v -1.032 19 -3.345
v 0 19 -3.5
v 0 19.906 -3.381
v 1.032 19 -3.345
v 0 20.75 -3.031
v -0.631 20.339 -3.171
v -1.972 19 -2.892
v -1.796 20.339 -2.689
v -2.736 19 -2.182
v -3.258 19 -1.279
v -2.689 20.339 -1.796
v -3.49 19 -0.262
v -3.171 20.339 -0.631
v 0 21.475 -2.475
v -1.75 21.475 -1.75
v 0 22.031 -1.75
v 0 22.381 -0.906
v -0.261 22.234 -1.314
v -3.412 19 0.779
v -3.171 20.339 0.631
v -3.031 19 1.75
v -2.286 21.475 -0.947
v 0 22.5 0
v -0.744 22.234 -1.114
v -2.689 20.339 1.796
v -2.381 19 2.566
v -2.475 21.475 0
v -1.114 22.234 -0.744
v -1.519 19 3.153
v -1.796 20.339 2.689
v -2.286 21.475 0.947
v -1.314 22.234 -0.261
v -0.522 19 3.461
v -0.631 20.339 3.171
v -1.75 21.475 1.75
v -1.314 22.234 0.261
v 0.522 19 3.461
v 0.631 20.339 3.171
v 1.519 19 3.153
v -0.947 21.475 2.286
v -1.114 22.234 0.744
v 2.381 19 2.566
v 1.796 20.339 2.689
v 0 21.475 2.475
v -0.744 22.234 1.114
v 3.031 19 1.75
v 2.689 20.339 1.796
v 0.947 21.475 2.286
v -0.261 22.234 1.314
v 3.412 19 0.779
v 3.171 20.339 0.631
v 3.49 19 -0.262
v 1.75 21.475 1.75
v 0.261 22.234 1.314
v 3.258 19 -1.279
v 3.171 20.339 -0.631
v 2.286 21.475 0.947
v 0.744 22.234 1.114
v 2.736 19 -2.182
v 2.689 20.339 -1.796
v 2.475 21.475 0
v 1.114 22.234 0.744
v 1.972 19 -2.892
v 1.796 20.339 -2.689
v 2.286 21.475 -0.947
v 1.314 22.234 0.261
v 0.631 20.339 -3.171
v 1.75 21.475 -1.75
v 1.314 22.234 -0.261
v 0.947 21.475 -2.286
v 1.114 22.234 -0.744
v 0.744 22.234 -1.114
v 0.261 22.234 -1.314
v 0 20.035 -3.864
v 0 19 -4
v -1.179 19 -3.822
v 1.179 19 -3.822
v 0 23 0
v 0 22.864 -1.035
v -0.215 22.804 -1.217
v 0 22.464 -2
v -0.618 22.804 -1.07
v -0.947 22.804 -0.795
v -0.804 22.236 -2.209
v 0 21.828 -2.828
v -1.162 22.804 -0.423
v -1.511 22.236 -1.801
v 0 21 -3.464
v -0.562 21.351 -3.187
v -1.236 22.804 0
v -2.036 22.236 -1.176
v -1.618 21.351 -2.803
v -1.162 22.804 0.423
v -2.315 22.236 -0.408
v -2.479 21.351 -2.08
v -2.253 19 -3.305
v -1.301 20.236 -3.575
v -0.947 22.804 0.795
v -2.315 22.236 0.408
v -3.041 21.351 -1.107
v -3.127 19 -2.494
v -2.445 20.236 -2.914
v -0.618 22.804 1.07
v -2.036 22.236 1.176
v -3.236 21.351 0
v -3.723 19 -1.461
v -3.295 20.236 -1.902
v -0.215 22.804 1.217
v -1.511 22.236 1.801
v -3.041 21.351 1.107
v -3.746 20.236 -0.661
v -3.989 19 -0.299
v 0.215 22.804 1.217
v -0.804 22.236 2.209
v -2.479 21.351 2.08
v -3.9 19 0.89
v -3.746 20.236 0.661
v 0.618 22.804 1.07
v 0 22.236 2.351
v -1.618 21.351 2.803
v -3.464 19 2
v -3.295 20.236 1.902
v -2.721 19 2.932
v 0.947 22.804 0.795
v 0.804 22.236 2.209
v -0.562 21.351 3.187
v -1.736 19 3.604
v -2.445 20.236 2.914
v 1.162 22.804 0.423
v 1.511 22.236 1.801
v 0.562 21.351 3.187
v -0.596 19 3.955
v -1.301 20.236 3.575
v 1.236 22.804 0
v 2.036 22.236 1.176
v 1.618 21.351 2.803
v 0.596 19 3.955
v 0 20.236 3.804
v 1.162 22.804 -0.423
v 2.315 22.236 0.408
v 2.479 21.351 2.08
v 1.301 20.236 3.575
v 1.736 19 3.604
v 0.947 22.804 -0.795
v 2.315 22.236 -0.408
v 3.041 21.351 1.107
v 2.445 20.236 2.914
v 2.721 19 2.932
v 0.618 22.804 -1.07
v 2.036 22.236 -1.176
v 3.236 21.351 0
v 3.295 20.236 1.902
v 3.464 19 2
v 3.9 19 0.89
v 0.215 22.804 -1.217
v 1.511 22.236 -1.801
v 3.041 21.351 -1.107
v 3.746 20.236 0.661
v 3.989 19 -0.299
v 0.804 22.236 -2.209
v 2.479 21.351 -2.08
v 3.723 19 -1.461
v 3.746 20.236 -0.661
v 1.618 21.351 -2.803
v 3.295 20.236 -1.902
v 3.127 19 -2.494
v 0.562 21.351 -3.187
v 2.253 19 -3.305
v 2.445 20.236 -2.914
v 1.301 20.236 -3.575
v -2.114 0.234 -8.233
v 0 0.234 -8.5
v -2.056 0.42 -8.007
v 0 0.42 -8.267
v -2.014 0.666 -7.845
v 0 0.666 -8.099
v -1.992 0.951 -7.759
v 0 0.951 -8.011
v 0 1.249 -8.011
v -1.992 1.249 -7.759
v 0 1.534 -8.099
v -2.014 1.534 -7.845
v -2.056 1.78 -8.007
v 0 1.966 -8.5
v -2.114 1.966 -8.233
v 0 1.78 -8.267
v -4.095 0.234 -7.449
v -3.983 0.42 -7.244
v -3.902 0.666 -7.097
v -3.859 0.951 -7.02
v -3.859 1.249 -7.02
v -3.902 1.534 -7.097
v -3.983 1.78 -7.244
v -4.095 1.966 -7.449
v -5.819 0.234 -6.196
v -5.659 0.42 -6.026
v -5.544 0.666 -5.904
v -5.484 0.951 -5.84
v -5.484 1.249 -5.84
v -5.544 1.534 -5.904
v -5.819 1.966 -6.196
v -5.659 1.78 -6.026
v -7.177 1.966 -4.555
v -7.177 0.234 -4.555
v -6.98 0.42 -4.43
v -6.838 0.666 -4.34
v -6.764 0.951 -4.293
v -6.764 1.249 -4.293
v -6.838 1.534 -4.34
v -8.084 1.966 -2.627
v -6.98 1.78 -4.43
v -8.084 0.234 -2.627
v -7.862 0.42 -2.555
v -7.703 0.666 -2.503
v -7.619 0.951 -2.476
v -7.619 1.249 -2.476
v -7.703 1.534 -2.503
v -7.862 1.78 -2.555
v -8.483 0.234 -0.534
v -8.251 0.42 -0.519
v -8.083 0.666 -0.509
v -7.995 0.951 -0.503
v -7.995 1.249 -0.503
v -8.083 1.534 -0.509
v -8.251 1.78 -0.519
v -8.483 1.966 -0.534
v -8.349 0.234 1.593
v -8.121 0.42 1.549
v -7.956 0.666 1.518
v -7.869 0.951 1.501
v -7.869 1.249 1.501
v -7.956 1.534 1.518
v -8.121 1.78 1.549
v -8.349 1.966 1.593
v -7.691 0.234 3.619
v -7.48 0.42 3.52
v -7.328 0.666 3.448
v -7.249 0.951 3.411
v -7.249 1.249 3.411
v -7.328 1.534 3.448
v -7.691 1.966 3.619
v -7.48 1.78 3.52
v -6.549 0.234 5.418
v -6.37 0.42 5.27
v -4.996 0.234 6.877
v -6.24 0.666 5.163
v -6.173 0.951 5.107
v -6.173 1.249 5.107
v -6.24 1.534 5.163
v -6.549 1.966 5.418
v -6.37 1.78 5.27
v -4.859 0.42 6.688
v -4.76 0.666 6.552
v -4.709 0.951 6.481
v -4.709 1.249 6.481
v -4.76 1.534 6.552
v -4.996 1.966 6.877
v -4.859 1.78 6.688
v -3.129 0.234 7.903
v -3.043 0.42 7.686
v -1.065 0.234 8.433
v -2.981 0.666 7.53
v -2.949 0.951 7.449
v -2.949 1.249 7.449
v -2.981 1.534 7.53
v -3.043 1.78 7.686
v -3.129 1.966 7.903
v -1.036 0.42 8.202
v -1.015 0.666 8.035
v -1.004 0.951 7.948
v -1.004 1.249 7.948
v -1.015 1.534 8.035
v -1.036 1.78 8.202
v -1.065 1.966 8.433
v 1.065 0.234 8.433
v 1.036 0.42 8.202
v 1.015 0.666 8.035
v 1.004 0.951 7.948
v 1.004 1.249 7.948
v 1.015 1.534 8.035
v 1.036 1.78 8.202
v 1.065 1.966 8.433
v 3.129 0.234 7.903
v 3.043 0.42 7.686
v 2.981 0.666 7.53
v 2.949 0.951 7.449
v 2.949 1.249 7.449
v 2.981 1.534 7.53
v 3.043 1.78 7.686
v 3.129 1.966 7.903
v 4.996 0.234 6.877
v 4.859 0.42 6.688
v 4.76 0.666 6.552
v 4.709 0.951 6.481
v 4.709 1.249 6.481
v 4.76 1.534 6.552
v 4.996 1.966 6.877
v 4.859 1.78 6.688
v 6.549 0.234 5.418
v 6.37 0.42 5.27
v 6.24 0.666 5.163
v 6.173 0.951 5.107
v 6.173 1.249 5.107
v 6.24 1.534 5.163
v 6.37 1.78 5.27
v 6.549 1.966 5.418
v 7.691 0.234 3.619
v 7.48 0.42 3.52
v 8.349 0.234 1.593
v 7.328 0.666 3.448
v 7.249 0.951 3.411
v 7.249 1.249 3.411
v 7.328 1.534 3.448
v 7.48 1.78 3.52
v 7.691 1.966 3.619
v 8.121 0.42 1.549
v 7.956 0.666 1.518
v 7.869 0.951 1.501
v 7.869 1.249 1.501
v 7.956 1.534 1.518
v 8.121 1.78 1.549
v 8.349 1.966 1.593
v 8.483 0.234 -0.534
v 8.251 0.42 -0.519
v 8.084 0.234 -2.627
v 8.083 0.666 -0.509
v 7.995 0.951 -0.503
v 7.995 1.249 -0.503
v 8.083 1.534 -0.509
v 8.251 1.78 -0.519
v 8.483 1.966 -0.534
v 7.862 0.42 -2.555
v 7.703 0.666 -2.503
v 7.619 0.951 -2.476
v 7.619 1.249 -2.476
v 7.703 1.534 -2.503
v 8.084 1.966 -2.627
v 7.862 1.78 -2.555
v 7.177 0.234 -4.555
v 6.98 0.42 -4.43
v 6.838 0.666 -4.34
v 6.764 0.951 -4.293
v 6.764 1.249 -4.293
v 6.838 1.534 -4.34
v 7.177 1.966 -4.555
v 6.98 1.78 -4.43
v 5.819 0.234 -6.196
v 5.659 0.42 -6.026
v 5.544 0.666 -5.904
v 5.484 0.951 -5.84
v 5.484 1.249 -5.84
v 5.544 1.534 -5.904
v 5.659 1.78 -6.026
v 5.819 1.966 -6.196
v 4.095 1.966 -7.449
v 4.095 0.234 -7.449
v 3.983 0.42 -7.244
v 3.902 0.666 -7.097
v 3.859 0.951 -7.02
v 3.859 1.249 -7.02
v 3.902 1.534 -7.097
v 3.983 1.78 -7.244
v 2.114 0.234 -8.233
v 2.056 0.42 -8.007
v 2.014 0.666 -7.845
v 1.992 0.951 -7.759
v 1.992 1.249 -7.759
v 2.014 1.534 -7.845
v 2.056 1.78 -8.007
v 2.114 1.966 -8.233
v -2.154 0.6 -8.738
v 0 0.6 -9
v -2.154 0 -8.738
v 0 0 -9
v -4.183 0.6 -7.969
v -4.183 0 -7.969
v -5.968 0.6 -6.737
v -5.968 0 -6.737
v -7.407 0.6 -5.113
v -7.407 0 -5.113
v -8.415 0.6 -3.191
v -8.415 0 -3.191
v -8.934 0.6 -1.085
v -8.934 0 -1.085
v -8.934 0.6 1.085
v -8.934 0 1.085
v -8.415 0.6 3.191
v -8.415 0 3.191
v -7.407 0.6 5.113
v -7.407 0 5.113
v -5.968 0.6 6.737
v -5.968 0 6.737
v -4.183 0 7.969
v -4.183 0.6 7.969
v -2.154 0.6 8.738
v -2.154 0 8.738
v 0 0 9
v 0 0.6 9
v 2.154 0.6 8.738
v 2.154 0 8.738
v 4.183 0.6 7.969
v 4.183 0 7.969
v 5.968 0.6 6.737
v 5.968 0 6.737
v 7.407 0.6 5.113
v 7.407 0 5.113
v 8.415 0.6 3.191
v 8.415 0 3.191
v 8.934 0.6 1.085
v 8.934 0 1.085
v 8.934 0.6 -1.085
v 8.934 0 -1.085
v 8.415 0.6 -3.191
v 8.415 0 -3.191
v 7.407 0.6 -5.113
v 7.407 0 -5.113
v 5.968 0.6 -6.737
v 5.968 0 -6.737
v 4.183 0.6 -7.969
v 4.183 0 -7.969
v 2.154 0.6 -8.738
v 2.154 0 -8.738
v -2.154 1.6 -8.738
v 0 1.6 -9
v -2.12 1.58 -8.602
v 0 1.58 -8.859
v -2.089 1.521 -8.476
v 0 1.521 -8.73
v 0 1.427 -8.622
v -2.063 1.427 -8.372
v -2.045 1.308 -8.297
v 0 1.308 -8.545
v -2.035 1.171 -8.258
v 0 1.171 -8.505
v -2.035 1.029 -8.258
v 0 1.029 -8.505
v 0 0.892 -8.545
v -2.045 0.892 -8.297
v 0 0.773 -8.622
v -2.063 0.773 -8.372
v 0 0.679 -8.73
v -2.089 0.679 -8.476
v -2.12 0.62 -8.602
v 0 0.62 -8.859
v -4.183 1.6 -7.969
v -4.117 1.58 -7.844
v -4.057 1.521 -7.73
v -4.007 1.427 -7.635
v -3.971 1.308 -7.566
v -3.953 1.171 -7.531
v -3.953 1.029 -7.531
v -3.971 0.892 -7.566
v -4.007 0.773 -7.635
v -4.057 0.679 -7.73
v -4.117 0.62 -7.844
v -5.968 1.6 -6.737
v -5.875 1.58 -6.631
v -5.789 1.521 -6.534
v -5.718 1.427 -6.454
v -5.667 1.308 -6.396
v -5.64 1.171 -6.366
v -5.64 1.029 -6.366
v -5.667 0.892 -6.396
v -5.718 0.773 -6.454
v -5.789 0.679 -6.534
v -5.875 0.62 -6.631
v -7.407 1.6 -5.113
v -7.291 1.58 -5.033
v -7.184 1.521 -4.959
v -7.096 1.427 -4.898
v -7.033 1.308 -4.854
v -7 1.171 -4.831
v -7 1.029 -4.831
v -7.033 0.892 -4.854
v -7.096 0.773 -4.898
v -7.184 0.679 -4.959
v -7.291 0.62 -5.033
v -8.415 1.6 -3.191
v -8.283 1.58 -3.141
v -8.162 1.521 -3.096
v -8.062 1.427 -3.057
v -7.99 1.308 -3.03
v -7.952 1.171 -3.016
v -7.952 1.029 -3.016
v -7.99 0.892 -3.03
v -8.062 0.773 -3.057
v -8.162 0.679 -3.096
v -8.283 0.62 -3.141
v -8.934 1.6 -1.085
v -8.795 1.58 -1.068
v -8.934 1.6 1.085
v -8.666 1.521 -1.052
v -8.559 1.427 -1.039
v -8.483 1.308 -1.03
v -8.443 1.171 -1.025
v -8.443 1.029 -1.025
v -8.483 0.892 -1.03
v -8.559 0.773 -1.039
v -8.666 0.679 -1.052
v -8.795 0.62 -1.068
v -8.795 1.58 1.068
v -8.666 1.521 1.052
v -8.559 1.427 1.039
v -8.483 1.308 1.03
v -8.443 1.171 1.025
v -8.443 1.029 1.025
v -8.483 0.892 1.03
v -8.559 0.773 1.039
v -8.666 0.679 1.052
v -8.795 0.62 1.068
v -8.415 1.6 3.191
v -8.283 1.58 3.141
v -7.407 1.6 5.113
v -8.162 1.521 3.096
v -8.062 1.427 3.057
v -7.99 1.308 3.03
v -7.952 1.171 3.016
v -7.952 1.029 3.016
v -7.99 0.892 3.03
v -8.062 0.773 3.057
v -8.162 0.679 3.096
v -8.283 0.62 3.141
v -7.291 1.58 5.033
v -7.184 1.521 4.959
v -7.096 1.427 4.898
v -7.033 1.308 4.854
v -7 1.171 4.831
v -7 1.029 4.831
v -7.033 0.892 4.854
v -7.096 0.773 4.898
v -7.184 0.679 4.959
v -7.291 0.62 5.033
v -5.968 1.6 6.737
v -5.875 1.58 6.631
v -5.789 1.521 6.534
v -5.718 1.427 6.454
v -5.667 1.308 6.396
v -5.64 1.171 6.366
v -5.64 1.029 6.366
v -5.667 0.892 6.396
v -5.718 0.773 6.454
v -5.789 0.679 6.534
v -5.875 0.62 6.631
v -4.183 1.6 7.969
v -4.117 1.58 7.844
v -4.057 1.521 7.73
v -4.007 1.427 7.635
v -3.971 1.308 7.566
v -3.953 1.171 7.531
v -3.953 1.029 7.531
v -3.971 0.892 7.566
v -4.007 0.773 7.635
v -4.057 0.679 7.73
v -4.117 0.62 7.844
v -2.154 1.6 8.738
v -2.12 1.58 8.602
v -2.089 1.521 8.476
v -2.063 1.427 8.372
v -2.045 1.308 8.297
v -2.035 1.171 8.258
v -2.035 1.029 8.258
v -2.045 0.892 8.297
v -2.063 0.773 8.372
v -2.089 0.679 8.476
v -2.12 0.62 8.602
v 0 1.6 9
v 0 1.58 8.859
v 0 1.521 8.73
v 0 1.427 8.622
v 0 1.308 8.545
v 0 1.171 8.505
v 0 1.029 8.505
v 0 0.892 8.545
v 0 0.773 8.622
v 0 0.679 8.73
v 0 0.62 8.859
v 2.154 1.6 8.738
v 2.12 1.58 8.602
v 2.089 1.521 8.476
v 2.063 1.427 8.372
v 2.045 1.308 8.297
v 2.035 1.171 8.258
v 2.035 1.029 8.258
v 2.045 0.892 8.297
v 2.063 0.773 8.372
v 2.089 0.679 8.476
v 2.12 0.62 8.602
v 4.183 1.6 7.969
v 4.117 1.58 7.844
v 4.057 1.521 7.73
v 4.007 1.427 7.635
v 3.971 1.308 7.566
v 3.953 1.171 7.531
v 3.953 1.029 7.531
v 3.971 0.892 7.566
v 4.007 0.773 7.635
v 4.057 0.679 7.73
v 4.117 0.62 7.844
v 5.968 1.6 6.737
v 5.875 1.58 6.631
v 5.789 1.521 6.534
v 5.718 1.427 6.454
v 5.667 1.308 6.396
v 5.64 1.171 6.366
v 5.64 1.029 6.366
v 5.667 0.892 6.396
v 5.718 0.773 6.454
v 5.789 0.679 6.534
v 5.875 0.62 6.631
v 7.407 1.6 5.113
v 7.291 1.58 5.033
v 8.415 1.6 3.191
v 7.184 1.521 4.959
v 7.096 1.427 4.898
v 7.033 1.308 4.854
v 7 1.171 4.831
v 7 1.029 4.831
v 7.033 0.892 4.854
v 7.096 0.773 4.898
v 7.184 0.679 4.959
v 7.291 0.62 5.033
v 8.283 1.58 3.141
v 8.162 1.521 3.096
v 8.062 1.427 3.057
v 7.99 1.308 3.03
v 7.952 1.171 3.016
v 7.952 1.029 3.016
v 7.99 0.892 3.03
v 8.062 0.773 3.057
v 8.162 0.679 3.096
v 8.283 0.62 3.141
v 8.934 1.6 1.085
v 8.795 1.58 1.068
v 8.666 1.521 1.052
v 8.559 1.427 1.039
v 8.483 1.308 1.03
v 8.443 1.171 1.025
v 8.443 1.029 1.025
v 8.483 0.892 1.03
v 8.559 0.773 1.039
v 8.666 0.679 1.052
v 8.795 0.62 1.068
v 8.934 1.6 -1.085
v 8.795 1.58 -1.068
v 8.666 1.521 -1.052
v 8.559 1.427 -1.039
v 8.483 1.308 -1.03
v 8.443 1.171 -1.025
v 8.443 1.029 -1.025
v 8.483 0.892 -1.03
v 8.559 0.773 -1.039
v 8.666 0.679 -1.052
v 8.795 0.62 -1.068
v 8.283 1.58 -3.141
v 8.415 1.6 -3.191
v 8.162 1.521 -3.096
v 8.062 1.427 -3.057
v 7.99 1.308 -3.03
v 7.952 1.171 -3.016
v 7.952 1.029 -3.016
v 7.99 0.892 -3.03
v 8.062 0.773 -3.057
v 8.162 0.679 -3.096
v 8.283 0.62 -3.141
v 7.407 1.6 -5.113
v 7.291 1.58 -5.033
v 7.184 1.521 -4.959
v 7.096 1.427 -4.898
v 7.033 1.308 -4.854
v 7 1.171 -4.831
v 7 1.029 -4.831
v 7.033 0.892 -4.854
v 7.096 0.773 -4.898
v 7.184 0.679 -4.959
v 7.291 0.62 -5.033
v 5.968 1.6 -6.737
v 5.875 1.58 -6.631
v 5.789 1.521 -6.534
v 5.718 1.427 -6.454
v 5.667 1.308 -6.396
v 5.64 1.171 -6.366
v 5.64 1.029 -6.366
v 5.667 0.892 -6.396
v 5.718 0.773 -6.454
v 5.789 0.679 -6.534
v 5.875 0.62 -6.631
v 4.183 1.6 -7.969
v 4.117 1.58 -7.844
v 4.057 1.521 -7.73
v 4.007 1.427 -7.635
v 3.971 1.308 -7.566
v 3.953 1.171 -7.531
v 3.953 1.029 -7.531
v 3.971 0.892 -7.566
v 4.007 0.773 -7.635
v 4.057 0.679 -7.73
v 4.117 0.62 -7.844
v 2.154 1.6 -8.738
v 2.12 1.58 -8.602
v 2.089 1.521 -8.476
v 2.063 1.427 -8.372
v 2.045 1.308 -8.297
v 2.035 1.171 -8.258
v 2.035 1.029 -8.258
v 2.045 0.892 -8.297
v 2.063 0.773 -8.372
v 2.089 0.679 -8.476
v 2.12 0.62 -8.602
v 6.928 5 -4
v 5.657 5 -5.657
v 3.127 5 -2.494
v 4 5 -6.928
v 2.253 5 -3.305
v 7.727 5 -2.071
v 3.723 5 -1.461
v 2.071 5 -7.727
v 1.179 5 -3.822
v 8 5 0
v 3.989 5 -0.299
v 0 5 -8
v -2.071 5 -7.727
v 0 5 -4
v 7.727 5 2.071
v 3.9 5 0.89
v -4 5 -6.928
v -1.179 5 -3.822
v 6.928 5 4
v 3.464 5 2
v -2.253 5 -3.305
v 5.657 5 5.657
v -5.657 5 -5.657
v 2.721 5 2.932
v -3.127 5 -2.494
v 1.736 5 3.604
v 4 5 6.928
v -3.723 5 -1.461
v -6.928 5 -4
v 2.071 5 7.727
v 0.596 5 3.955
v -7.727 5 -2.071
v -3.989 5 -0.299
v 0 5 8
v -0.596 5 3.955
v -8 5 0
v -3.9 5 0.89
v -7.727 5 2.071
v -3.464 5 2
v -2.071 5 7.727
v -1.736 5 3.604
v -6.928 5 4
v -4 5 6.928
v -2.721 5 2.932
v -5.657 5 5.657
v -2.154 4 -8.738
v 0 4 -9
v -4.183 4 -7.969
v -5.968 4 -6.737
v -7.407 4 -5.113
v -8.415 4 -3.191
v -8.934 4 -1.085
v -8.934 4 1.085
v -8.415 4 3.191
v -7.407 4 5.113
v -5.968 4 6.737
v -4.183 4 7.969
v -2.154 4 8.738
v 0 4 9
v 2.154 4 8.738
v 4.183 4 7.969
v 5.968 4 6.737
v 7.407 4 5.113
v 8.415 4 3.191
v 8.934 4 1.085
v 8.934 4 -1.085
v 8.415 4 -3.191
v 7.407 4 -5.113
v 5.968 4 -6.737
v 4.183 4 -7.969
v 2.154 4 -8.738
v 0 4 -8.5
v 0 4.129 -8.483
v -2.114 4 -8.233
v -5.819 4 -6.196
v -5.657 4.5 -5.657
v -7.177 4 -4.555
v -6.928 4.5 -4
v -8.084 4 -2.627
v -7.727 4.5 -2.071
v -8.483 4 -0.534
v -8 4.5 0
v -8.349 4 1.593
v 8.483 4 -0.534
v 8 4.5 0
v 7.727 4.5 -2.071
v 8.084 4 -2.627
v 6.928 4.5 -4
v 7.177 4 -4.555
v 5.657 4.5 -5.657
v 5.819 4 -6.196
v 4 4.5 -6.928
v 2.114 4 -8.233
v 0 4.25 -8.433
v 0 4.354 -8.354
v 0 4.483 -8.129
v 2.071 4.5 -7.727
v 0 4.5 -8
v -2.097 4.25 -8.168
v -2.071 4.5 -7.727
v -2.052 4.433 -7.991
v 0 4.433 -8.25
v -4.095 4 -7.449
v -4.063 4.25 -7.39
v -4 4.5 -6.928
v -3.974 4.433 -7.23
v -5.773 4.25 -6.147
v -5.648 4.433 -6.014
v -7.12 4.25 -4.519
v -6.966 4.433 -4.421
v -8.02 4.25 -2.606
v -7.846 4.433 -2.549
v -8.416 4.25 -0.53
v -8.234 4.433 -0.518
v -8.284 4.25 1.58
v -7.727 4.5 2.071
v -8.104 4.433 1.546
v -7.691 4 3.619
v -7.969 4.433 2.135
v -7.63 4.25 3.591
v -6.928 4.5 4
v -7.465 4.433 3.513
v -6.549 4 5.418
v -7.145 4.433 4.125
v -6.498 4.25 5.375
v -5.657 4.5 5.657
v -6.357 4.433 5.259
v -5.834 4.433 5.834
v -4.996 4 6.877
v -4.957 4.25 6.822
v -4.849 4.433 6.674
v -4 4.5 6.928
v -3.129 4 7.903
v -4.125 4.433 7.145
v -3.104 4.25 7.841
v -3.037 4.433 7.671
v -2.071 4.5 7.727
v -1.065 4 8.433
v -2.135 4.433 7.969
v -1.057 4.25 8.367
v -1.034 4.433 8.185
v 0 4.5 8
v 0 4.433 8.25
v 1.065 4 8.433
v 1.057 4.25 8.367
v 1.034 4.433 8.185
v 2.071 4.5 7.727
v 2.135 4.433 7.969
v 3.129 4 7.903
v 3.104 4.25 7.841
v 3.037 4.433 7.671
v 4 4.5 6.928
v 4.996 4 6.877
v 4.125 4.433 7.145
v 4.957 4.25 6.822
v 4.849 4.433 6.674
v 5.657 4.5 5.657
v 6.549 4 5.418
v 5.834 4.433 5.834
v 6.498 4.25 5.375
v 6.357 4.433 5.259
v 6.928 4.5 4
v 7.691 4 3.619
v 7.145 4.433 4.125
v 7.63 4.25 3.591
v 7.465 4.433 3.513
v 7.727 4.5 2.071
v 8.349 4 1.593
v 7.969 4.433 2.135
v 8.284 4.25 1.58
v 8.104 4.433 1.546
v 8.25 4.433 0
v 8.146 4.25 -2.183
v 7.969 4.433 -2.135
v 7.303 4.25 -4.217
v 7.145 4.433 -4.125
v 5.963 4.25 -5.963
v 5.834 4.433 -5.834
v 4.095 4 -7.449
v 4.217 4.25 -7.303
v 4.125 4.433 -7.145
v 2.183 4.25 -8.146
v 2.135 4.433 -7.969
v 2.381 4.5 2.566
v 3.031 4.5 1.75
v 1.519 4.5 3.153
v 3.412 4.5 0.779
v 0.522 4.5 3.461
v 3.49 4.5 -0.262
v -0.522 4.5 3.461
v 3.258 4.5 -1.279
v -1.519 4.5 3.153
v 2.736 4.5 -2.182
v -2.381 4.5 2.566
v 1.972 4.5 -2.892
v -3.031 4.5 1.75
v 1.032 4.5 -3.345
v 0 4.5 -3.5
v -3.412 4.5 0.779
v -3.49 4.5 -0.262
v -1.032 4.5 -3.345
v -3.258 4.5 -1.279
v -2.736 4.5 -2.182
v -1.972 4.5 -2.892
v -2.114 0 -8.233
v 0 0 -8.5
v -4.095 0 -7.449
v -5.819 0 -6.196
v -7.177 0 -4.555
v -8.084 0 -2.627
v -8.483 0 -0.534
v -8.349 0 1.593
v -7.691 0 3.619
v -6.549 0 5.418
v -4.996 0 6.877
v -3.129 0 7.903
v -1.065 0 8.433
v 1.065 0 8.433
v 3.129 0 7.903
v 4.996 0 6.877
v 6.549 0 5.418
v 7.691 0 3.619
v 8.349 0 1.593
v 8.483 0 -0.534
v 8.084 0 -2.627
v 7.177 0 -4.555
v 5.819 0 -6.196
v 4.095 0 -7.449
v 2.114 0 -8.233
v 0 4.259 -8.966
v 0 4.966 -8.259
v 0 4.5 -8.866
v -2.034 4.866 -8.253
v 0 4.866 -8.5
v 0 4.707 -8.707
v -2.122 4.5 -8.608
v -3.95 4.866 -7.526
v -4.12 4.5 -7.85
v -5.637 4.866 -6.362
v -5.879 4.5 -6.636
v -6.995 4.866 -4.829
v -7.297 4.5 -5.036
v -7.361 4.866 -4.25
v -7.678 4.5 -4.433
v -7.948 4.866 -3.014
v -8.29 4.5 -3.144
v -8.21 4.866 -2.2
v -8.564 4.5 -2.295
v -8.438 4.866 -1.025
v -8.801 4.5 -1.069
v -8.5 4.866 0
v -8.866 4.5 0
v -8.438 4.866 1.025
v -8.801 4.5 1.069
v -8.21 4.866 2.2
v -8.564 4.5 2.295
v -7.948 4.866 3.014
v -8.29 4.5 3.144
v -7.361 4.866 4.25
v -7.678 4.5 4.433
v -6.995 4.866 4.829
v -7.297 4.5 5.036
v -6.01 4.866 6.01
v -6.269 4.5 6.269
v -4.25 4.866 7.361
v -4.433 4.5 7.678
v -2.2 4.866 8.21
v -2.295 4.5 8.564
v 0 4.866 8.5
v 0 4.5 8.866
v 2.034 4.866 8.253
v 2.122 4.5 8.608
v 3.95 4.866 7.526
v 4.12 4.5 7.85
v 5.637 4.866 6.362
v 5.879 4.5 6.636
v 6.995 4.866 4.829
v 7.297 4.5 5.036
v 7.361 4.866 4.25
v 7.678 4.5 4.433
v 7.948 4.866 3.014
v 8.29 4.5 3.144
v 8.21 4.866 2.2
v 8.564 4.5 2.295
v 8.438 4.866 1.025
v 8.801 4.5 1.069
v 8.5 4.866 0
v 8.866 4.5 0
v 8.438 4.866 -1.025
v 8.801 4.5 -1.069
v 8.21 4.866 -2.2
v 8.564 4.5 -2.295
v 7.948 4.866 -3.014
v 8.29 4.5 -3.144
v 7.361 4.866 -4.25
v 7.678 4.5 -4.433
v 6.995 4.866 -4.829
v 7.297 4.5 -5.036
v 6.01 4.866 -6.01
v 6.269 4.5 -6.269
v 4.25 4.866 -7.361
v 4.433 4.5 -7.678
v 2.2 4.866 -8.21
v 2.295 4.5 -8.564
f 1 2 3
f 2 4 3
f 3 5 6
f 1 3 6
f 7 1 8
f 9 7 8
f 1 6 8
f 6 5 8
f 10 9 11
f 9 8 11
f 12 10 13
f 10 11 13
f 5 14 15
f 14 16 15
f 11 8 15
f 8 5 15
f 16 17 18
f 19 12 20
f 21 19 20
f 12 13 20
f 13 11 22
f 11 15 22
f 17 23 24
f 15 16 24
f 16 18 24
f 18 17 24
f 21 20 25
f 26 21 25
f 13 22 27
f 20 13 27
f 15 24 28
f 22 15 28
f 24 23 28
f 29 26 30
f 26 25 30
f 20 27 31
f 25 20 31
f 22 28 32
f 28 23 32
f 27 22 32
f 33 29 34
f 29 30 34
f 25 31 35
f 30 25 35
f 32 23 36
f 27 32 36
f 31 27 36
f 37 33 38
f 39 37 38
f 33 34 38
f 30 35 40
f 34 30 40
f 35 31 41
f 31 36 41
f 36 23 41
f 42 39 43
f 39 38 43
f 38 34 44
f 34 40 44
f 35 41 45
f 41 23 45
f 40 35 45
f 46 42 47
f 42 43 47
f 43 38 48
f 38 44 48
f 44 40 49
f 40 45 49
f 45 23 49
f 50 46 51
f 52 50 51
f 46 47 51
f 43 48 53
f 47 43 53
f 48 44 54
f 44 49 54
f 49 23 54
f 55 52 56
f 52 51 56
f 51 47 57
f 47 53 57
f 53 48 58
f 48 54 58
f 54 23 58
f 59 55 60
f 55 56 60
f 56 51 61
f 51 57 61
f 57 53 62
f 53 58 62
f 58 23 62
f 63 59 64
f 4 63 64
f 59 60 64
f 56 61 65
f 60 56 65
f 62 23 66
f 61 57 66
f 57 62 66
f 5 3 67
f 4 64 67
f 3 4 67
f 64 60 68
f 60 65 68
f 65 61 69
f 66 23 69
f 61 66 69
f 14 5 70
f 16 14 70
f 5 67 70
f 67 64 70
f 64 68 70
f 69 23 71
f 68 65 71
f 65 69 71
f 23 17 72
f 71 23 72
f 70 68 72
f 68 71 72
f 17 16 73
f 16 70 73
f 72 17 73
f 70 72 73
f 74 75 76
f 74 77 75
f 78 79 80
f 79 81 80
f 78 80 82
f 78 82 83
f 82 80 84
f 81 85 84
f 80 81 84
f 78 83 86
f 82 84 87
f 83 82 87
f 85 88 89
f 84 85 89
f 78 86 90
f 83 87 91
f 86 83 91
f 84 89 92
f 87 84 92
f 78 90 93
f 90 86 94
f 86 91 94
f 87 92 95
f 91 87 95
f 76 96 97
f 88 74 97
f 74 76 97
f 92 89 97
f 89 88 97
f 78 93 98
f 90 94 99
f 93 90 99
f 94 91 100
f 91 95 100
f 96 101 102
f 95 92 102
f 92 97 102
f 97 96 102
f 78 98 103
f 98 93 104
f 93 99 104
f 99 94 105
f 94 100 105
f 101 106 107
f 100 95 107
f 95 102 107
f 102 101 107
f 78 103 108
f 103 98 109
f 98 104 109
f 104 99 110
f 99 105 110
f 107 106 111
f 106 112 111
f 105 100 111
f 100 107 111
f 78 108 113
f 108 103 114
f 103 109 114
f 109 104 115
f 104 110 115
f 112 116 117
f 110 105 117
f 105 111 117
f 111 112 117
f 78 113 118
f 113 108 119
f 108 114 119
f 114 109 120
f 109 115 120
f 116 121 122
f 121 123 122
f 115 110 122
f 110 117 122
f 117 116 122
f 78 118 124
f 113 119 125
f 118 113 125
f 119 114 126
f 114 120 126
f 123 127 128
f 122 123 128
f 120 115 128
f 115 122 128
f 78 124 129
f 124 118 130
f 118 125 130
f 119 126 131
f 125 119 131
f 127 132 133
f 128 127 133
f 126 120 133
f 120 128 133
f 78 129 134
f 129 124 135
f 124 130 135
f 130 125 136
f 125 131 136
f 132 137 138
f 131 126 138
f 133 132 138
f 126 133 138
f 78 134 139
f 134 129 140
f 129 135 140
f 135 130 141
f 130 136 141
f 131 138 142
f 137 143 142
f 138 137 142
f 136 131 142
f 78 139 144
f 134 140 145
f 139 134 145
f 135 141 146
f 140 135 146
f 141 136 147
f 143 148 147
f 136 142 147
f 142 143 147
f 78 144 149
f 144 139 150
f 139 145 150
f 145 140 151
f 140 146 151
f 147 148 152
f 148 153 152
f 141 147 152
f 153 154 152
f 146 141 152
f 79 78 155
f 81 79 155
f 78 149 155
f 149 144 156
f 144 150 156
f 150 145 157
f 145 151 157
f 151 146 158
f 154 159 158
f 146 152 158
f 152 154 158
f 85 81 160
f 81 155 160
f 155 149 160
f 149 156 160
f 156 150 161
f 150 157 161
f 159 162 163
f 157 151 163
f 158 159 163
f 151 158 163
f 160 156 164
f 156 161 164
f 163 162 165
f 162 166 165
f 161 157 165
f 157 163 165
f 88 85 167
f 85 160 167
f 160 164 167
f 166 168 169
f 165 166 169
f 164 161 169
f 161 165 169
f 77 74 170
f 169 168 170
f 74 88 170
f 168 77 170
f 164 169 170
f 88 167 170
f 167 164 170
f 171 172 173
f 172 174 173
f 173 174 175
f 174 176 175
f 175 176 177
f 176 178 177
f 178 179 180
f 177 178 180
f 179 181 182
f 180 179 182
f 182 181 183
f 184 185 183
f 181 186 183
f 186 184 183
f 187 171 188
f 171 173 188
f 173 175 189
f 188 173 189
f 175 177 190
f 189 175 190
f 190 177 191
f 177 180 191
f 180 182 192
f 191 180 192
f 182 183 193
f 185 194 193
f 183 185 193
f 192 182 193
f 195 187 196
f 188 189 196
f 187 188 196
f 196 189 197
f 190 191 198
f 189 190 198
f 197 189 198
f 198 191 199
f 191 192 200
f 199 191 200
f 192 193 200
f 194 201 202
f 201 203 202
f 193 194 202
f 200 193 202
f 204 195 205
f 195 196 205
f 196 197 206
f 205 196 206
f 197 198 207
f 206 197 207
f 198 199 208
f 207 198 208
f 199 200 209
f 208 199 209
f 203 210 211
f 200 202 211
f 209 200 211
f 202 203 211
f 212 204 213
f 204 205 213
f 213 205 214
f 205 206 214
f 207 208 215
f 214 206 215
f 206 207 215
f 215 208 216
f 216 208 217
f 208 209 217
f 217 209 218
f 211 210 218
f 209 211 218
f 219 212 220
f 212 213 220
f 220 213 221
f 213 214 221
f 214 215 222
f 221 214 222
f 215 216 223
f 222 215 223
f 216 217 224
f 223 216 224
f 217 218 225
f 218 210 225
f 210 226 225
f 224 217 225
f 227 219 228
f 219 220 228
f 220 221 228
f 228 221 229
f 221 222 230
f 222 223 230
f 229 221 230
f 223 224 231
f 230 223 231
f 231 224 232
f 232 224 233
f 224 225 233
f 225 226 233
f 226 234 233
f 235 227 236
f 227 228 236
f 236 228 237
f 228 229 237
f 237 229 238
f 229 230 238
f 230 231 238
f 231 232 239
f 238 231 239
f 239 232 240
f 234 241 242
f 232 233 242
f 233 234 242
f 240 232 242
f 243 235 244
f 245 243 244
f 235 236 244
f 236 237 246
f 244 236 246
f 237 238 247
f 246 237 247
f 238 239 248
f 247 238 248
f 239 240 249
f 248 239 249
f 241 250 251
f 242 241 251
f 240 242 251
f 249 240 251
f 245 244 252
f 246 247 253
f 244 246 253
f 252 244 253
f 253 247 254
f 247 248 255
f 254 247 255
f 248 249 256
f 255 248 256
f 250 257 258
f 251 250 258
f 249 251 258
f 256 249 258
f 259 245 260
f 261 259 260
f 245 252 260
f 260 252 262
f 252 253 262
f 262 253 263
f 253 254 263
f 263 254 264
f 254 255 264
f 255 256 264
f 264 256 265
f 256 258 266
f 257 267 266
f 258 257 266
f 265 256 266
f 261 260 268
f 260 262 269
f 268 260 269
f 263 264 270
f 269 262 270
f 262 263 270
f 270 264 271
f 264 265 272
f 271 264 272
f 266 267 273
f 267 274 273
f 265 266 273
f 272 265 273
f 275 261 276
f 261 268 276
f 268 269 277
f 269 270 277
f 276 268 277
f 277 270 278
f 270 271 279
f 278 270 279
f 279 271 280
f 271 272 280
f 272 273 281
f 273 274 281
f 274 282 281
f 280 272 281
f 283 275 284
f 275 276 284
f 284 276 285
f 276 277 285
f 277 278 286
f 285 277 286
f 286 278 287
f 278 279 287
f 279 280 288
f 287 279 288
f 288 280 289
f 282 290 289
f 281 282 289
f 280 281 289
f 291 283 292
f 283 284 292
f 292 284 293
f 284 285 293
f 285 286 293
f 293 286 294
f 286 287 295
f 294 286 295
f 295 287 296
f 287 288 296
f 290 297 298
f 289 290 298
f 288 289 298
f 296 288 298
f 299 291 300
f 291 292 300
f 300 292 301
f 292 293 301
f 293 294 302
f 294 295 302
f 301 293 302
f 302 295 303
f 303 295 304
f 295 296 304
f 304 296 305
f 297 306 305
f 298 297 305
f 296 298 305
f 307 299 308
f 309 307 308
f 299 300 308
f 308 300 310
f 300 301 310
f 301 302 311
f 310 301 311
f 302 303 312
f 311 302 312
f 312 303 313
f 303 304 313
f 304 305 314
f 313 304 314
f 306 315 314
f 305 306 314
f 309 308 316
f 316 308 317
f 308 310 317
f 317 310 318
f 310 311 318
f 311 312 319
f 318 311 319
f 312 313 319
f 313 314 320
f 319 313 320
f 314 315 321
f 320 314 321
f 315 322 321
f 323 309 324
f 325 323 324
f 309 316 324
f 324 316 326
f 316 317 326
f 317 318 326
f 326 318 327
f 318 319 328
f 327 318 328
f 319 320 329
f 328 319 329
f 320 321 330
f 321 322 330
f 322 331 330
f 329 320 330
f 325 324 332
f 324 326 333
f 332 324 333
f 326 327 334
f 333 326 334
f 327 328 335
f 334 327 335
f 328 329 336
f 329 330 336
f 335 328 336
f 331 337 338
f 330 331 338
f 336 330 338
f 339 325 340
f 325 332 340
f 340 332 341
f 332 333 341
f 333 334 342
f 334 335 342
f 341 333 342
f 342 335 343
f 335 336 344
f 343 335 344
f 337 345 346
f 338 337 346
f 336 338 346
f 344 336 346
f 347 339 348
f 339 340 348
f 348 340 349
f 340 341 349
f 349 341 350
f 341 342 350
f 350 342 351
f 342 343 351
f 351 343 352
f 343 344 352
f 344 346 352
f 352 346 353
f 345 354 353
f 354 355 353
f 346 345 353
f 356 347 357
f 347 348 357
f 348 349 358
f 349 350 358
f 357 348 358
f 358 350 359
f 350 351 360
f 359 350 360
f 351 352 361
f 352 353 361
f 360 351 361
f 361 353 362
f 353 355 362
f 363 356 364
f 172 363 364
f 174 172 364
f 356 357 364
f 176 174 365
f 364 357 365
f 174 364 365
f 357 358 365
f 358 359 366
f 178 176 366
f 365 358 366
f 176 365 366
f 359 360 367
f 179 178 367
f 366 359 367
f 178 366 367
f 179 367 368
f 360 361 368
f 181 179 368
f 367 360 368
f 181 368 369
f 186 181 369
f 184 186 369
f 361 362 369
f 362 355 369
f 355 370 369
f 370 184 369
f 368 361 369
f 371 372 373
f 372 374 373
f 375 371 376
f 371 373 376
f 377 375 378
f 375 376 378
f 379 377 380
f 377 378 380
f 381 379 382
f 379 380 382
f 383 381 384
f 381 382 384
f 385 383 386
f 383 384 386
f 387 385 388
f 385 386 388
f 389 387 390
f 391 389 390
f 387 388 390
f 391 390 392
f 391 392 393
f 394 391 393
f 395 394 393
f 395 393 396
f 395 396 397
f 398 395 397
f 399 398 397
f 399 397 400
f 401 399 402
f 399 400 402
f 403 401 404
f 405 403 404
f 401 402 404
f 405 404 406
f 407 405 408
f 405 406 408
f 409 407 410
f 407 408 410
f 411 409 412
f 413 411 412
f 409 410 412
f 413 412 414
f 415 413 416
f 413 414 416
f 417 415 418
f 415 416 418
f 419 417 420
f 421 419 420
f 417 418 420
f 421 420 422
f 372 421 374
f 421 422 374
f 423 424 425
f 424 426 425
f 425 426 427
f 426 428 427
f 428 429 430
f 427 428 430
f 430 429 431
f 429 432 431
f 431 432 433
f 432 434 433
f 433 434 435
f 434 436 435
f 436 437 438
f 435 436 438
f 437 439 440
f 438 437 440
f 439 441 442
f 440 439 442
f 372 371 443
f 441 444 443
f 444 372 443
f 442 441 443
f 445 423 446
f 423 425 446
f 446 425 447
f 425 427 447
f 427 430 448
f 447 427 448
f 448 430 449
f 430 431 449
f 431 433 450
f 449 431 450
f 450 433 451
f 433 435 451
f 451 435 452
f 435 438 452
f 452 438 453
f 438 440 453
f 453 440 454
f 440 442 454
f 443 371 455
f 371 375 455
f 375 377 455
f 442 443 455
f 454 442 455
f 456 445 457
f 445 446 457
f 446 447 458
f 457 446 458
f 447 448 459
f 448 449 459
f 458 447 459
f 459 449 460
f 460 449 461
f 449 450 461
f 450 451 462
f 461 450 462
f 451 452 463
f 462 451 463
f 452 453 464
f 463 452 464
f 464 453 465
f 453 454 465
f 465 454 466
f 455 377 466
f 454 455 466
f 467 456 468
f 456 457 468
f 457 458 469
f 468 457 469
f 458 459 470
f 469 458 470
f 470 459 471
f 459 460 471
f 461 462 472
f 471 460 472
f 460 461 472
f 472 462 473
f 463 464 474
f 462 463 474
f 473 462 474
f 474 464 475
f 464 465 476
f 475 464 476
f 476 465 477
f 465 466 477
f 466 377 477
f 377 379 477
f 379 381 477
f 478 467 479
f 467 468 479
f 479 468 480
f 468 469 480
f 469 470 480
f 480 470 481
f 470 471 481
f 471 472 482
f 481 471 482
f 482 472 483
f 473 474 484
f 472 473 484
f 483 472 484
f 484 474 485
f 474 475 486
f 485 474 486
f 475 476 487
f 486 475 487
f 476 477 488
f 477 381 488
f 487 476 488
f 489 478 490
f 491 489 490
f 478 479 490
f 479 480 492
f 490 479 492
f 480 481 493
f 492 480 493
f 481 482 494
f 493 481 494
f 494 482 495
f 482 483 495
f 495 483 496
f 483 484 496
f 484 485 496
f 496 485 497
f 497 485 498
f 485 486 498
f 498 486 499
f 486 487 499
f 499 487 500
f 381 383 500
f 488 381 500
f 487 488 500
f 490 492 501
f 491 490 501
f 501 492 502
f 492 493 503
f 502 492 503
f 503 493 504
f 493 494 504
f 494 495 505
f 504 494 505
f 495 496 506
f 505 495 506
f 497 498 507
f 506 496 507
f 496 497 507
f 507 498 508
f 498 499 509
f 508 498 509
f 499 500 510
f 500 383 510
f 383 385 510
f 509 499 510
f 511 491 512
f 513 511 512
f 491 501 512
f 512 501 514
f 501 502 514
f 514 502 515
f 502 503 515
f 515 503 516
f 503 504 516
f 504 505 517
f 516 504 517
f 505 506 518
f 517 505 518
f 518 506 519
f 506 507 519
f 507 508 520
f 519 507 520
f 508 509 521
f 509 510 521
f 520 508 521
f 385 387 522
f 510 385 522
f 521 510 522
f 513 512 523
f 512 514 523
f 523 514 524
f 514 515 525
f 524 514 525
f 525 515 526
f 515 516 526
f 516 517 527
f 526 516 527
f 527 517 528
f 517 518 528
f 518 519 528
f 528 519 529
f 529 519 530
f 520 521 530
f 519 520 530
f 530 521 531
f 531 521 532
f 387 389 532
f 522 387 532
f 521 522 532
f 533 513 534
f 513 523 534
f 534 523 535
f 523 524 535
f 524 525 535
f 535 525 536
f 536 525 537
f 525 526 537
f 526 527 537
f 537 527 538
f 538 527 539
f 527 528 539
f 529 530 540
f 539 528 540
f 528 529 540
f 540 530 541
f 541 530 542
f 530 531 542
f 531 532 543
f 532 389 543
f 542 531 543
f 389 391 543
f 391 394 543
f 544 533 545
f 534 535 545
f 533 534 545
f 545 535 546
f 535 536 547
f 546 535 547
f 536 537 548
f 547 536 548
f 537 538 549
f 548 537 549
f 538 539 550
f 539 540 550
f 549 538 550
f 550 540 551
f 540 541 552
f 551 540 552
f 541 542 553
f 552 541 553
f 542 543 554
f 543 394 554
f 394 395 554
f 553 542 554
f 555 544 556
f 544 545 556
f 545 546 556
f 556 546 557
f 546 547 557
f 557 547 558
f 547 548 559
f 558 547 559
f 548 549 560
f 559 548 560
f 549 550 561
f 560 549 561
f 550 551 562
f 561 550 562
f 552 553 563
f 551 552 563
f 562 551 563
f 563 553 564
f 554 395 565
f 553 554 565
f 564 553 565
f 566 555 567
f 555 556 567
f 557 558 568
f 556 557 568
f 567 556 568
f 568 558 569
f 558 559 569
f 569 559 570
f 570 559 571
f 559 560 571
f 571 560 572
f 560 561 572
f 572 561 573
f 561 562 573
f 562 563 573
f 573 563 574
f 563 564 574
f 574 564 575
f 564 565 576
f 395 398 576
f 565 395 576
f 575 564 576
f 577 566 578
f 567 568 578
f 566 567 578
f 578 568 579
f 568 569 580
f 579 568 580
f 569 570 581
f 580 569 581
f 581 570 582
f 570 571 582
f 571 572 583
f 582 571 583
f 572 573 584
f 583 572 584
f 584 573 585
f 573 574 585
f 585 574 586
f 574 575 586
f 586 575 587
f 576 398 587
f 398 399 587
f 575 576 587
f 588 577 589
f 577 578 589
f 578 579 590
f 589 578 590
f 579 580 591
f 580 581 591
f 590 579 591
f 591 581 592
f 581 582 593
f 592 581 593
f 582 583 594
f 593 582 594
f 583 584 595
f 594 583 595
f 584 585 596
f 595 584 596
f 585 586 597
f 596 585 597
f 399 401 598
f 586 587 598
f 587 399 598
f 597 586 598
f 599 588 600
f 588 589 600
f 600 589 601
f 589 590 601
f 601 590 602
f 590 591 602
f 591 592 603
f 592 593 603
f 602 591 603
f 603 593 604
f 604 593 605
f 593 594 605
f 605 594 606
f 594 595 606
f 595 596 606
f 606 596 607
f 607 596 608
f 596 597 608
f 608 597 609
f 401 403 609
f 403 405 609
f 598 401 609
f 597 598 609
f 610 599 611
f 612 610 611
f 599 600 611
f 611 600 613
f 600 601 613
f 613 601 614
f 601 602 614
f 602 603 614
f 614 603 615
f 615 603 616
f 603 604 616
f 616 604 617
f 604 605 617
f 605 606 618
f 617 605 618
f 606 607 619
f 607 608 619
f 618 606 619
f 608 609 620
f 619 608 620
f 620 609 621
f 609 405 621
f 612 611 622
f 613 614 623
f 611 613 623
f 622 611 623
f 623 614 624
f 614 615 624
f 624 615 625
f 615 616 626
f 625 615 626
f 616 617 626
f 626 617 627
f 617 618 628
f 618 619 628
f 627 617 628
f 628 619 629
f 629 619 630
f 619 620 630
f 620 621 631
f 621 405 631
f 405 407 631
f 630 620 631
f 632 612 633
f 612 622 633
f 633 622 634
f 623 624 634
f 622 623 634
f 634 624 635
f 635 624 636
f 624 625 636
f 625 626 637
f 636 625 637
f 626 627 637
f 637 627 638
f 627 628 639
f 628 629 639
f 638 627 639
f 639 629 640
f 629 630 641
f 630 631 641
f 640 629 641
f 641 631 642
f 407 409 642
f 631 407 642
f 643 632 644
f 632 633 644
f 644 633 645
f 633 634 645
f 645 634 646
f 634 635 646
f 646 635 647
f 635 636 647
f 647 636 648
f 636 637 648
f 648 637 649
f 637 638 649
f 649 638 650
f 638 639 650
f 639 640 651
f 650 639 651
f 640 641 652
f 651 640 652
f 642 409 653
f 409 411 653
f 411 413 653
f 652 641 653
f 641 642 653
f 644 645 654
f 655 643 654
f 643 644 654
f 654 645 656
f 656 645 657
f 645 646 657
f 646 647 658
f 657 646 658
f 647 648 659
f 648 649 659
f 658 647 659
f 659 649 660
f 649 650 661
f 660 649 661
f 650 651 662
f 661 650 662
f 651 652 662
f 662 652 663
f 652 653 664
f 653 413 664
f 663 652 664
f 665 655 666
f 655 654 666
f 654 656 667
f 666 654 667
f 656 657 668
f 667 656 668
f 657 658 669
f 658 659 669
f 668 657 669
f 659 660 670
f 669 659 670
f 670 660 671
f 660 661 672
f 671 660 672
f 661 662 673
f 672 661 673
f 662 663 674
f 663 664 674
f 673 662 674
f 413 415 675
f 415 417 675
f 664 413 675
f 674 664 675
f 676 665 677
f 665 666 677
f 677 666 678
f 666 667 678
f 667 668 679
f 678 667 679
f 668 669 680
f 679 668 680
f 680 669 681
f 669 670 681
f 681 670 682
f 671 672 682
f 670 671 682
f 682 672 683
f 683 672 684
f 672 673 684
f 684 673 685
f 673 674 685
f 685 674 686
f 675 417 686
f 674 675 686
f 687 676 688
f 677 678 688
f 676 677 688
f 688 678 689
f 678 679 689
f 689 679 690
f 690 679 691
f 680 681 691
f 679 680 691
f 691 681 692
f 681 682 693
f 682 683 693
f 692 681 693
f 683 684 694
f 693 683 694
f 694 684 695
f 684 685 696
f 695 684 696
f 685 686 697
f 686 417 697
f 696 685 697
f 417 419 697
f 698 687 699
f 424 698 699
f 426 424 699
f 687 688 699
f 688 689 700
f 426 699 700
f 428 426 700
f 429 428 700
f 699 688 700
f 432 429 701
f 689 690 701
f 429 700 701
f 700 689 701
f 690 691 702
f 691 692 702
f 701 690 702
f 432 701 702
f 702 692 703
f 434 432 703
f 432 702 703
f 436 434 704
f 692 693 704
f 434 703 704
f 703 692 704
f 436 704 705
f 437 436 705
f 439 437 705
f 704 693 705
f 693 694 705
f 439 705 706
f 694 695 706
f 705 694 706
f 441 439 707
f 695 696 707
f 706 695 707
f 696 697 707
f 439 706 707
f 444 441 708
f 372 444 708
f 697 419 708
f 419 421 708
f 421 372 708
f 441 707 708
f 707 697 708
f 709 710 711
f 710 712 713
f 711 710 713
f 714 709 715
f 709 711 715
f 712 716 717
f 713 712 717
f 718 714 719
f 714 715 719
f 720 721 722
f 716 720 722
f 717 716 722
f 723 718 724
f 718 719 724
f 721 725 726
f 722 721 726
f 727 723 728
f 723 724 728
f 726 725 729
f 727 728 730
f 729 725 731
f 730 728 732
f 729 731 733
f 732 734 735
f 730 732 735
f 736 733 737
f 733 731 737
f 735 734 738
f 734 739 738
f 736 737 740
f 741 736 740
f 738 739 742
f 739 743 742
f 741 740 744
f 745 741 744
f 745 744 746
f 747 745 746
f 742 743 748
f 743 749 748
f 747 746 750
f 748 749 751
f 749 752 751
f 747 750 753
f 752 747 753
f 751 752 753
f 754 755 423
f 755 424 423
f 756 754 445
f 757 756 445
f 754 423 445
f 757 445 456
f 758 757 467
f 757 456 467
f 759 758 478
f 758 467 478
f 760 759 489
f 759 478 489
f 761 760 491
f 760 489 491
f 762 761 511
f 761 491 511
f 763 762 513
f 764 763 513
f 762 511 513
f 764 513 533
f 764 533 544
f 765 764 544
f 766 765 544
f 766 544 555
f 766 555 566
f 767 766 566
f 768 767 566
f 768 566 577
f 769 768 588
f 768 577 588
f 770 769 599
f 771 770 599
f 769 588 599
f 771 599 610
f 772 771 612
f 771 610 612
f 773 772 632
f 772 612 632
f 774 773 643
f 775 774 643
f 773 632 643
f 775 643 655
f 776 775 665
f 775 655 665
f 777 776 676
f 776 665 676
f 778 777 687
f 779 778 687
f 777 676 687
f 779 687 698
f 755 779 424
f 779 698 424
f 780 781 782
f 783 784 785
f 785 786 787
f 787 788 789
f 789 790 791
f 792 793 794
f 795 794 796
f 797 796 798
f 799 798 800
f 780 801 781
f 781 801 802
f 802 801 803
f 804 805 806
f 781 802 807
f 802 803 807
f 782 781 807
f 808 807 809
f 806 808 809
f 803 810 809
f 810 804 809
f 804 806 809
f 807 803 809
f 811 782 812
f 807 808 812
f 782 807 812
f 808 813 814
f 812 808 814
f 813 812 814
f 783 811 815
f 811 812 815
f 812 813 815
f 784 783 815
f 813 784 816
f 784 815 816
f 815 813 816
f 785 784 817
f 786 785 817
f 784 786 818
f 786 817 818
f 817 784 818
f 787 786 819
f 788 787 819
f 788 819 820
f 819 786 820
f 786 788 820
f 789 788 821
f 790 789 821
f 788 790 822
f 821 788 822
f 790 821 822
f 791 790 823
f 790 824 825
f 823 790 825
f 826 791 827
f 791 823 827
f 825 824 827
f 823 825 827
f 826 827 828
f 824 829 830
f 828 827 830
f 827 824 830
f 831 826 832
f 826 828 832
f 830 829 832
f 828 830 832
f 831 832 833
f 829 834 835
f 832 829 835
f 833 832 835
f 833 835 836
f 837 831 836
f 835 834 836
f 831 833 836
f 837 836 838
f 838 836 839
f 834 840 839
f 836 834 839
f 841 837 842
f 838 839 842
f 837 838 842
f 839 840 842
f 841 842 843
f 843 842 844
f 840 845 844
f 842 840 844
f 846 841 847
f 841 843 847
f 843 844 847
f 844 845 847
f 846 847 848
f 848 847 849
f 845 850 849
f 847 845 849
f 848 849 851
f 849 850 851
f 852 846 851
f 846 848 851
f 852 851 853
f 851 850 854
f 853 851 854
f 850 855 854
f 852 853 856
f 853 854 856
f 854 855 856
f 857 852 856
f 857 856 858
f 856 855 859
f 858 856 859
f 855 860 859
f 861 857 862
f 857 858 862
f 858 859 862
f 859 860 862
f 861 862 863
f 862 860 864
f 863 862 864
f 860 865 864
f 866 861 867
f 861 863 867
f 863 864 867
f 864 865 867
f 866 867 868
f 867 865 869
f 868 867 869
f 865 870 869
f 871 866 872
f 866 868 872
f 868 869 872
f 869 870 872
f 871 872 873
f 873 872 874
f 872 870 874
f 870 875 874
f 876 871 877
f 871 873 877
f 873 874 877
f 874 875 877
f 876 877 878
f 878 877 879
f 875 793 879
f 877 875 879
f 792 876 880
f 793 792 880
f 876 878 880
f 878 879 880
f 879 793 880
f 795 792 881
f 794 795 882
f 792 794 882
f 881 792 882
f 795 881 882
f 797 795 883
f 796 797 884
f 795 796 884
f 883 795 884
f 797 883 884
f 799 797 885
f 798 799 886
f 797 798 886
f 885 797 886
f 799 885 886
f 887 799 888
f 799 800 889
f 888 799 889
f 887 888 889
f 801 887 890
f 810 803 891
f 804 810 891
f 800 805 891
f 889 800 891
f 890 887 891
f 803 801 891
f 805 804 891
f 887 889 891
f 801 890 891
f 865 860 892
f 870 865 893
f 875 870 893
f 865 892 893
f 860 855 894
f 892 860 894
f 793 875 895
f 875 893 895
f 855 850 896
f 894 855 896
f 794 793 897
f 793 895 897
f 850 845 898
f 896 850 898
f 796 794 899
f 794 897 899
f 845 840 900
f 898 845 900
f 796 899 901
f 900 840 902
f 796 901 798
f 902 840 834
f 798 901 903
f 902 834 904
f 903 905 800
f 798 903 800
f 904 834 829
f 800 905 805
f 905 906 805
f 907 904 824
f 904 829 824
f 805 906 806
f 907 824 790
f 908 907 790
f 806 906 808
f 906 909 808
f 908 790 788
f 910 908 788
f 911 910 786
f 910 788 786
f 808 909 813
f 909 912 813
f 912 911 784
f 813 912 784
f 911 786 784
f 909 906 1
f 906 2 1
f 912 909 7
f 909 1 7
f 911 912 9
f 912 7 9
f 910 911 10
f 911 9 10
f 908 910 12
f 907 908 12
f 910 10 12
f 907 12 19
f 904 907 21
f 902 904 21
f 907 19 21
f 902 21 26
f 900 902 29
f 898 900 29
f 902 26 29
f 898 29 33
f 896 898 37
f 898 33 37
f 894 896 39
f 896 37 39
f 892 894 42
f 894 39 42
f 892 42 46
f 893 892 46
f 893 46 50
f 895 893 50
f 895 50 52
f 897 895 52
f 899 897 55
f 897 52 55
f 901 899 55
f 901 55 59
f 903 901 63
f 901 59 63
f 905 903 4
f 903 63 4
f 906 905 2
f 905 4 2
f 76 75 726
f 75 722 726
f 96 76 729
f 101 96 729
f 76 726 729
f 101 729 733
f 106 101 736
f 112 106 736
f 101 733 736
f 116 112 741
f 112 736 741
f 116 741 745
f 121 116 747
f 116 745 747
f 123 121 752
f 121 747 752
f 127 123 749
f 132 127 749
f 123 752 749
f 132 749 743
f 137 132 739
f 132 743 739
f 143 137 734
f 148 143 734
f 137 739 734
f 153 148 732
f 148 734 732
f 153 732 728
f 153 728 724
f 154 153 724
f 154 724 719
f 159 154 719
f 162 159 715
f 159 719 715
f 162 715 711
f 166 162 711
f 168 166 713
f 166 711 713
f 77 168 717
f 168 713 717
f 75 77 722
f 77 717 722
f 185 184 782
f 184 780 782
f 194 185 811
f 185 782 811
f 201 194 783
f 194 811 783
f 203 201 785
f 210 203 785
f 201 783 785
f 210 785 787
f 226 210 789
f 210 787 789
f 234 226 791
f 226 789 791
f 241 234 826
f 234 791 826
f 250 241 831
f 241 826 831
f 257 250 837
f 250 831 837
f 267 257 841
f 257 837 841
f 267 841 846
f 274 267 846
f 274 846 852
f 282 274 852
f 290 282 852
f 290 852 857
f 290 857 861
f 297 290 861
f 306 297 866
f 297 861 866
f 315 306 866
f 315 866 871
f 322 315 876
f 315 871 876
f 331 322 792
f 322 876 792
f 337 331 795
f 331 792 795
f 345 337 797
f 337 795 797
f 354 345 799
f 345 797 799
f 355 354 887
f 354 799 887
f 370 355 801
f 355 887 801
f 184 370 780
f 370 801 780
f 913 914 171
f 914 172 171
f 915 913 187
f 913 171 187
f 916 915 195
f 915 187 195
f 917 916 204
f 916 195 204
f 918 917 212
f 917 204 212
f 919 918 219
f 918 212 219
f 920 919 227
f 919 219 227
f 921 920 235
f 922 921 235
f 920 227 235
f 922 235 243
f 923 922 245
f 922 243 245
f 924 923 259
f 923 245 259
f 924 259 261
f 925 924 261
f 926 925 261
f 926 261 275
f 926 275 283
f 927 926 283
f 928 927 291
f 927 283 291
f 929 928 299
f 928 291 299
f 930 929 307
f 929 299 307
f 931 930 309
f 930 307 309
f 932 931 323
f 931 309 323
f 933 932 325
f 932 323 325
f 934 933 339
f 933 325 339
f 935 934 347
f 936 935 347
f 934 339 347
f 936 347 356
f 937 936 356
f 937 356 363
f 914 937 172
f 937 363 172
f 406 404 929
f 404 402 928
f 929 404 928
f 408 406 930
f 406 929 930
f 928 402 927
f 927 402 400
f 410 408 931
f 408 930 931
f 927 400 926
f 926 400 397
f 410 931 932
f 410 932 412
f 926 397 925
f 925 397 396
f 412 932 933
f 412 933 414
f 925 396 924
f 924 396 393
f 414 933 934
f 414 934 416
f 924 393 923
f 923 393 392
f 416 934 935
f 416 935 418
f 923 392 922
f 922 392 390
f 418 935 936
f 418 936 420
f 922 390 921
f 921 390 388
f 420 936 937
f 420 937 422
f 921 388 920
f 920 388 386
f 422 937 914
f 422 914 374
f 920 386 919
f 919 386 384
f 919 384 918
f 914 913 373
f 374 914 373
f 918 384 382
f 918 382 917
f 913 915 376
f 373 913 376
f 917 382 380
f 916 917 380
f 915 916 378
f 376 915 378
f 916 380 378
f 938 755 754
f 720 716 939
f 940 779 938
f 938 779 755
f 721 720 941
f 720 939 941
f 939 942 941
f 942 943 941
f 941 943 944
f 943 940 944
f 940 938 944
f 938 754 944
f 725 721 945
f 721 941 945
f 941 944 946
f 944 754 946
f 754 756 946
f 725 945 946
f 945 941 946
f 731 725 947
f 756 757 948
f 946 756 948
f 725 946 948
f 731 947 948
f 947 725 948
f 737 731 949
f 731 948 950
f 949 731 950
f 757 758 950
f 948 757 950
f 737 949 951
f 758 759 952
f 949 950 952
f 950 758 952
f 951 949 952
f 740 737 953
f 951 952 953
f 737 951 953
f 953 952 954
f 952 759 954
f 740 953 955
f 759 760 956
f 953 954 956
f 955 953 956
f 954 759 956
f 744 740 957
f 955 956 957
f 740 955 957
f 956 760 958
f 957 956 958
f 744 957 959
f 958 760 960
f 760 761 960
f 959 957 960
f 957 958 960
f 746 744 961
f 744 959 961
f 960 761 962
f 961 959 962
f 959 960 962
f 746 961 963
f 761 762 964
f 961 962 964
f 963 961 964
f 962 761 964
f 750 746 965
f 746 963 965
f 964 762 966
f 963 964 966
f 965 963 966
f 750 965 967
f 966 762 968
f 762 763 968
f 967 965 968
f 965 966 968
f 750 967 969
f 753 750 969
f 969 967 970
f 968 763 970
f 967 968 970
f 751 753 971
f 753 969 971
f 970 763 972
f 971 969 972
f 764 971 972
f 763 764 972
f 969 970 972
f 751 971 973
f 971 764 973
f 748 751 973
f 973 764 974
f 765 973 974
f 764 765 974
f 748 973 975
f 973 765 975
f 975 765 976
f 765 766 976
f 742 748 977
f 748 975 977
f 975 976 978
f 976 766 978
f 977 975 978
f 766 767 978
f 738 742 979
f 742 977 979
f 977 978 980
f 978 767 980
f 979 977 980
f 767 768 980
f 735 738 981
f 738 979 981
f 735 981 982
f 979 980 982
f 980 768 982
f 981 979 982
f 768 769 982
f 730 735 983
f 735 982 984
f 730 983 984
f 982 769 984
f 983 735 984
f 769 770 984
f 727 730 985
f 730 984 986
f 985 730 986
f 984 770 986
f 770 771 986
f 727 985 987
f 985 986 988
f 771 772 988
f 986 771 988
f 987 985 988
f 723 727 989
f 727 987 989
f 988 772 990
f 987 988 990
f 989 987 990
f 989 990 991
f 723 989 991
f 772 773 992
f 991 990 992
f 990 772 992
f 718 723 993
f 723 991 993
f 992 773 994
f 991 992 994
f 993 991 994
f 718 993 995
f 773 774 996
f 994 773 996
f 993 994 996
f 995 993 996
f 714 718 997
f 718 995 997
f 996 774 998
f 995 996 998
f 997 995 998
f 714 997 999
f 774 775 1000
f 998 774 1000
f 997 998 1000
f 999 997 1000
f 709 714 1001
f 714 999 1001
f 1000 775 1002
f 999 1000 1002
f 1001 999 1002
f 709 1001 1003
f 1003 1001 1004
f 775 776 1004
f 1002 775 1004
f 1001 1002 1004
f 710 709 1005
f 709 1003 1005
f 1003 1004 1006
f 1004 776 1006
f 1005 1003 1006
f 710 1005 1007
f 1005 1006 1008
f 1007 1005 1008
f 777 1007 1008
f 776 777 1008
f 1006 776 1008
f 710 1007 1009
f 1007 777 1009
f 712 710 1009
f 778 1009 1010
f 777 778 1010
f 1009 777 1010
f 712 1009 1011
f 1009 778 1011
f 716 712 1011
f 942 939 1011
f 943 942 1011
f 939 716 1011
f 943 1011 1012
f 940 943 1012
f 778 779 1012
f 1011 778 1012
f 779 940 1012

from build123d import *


with BuildPart() as part:
    # Sketch1 → Revolve-Thin1 (revolve)
    with BuildSketch(Plane.XY, mode=Mode.PRIVATE) as revolve_thin1_sk:
        with BuildLine():
            ThreePointArc((0, 23), (2.828427125, 21.828427125), (4, 19))
            Line((4, 19), (4, 5))
            Line((4, 5), (8, 5))
            ThreePointArc((8, 5), (8.707106781, 4.707106781), (9, 4))
            Line((9, 4), (9, 1.6))
            ThreePointArc((9, 1.6), (8.5, 1.1), (9, 0.6))
            Line((9, 0.6), (9, 0))
            Line((9, 0), (8.5, 0))
            Line((8.5, 0), (8.5, 0.233974596))
            ThreePointArc((8.5, 0.233974596), (8, 1.1), (8.5, 1.966025404))
            Line((8.5, 1.966025404), (8.5, 4))
            ThreePointArc((8.5, 4), (8.353553391, 4.353553391), (8, 4.5))
            Line((8, 4.5), (3.5, 4.5))
            Line((3.5, 4.5), (3.5, 19))
            ThreePointArc((3.5, 19), (2.474873734, 21.474873734), (0, 22.5))
            Line((0, 22.5), (0, 23))
        make_face()
    revolve(revolve_thin1_sk.sketch.rotate(Axis((0, 0, 0), (0, 1, 0)), 90), axis=Axis((0, 0, 0), (0, 1, 0)))


solid = part.part
